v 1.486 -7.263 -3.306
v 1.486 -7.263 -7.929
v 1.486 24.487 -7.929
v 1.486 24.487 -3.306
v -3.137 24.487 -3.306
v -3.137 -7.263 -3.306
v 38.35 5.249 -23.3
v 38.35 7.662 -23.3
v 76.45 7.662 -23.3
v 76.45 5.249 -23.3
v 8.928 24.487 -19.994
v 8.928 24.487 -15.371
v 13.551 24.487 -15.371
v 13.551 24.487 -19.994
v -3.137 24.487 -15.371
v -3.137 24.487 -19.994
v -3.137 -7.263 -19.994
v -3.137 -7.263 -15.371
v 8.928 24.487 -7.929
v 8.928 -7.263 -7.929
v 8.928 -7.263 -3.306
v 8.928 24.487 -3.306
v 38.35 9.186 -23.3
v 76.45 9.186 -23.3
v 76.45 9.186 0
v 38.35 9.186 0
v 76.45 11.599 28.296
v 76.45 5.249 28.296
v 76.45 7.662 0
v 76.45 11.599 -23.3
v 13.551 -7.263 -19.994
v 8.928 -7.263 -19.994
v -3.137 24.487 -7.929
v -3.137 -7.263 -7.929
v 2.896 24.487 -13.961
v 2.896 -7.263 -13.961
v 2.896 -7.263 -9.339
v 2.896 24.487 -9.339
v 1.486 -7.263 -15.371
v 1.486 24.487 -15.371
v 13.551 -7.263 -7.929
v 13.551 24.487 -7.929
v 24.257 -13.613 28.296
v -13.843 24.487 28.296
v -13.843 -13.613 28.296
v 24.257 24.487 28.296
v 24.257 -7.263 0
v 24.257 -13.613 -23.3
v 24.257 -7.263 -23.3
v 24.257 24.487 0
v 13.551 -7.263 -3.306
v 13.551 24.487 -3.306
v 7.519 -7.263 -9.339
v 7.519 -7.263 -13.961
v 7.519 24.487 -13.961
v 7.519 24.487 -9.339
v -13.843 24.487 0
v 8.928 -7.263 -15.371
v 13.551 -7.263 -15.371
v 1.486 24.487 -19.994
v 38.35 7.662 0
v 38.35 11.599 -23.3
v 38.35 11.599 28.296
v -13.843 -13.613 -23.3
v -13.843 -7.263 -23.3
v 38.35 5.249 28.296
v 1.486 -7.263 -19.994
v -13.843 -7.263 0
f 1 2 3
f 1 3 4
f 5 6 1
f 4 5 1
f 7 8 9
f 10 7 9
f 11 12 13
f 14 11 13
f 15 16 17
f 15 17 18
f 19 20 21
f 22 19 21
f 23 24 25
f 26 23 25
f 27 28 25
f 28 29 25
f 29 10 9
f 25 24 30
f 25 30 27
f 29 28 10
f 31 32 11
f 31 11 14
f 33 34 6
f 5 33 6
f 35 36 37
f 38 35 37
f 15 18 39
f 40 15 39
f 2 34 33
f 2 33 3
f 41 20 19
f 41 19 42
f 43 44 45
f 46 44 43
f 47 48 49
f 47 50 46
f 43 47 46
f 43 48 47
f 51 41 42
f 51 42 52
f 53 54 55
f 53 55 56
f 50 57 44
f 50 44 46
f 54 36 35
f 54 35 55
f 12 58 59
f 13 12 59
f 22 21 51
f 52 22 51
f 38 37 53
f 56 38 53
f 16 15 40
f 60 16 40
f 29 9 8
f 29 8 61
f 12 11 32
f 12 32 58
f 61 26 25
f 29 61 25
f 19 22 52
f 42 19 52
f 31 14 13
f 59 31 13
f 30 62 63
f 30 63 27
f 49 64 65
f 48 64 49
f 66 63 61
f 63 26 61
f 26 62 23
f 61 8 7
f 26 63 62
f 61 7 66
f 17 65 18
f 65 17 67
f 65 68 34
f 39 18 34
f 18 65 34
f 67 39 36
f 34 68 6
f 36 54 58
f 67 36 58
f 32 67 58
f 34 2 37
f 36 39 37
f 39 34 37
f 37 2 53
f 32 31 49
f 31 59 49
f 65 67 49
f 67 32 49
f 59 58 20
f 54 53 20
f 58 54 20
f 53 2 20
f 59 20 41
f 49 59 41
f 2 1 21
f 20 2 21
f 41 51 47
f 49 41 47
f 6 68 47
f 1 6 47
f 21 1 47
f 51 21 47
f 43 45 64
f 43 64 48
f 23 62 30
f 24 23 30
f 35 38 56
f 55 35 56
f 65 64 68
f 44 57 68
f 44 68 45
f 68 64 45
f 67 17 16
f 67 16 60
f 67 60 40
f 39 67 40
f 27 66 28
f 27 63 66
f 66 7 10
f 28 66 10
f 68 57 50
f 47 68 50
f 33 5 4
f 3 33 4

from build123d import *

# Parameters (mm, degrees)
F0_W      = 38.1
F0_H      = 38.1
F1_DEPTH  = 28.2956
F2_W      = 4.6228
F2_H      = 4.6228
F3_DEPTH  = 38.1
F2_W_2    = 38.1
F2_H_2    = 23.3
F4_DEPTH  = 6.35
F5_W      = 38.1
F5_H      = 6.35
F6_DEPTH  = 23.3
F7_W      = 1.524
F7_H      = 23.3
F8_DEPTH  = 90.2937514673
F9_W      = 38.1
F9_H      = 2.413
F9_H_2    = 3.937
F10_DEPTH = 28.2956


with BuildPart() as f1:
    # F0 (on Top) → F1 (new body)
    with BuildSketch(Plane.XY):
        with Locations((5.2072124928, 5.4370228503)):
            Rectangle(F0_W, F0_H)
    extrude(amount=F1_DEPTH)



with BuildPart() as f3:
    # F2 (on face) → F3 (new body)
    with BuildSketch(Plane.XZ.offset(13.6129771497)):
        with Locations((11.2397124928, -5.6175)):
            Rectangle(F2_W, F2_H)
    extrude(amount=-F3_DEPTH)


with BuildPart() as f3b:
    # F2 (on face) → F3, piece 2 (new body)
    with BuildSketch(Plane.XZ.offset(13.6129771497)):
        with Locations((-0.8252875072, -5.6175)):
            Rectangle(F2_W, F2_H)
    extrude(amount=-F3_DEPTH)


with BuildPart() as f3c:
    # F2 (on face) → F3, piece 3 (new body)
    with BuildSketch(Plane.XZ.offset(13.6129771497)):
        with Locations((5.2072124928, -11.65)):
            Rectangle(F2_W, F2_H)
    extrude(amount=-F3_DEPTH)


with BuildPart() as f3d:
    # F2 (on face) → F3, piece 4 (new body)
    with BuildSketch(Plane.XZ.offset(13.6129771497)):
        with Locations((11.2397124928, -17.6825)):
            Rectangle(F2_W, F2_H)
    extrude(amount=-F3_DEPTH)


with BuildPart() as f3e:
    # F2 (on face) → F3, piece 5 (new body)
    with BuildSketch(Plane.XZ.offset(13.6129771497)):
        with Locations((-0.8252875072, -17.6825)):
            Rectangle(F2_W, F2_H)
    extrude(amount=-F3_DEPTH)


with BuildPart() as f1_1:
    add(f1.part)

    add(f3.part)  # F4 merges F3

    add(f3b.part)  # F4 merges F3b

    add(f3c.part)  # F4 merges F3c

    add(f3d.part)  # F4 merges F3d

    add(f3e.part)  # F4 merges F3e
    # F2 (on face) → F4 (join)
    with BuildSketch(Plane.XZ.offset(13.6129771497)):
        with Locations((5.2072124928, -11.65)):
            Rectangle(F2_W_2, F2_H_2)
        with Locations((-0.8252875072, -17.6825)):
            Rectangle(F2_W, F2_H, mode=Mode.SUBTRACT)
        with Locations((-0.8252875072, -5.6175)):
            Rectangle(F2_W, F2_H, mode=Mode.SUBTRACT)
        with Locations((11.2397124928, -17.6825)):
            Rectangle(F2_W, F2_H, mode=Mode.SUBTRACT)
        with Locations((5.2072124928, -11.65)):
            Rectangle(F2_W, F2_H, mode=Mode.SUBTRACT)
        with Locations((11.2397124928, -5.6175)):
            Rectangle(F2_W, F2_H, mode=Mode.SUBTRACT)
    extrude(amount=-F4_DEPTH)


with BuildPart() as f6:
    # F5 (on Top) → F6 (new body)
    with BuildSketch(Plane.XY):
        with Locations((57.3999639601, 8.4235698427)):
            Rectangle(F5_W, F5_H)
    extrude(amount=-F6_DEPTH)

    # F7 (on face) → F8 (cut, through all)
    with BuildSketch(Plane.YZ.offset(76.4499639601)):
        with Locations((8.4235698427, -11.65)):
            Rectangle(F7_W, F7_H)
    extrude(amount=-F8_DEPTH, mode=Mode.SUBTRACT)

    # F9 (on face) → F10 (join)
    with BuildSketch(Plane.XY):
        with Locations((57.3999639601, 6.4550698427)):
            Rectangle(F9_W, F9_H)
        with Locations((57.3999639601, 9.6300698427)):
            Rectangle(F9_W, F9_H_2)
    extrude(amount=F10_DEPTH)


solid = Compound([f1_1.part, f6.part])
